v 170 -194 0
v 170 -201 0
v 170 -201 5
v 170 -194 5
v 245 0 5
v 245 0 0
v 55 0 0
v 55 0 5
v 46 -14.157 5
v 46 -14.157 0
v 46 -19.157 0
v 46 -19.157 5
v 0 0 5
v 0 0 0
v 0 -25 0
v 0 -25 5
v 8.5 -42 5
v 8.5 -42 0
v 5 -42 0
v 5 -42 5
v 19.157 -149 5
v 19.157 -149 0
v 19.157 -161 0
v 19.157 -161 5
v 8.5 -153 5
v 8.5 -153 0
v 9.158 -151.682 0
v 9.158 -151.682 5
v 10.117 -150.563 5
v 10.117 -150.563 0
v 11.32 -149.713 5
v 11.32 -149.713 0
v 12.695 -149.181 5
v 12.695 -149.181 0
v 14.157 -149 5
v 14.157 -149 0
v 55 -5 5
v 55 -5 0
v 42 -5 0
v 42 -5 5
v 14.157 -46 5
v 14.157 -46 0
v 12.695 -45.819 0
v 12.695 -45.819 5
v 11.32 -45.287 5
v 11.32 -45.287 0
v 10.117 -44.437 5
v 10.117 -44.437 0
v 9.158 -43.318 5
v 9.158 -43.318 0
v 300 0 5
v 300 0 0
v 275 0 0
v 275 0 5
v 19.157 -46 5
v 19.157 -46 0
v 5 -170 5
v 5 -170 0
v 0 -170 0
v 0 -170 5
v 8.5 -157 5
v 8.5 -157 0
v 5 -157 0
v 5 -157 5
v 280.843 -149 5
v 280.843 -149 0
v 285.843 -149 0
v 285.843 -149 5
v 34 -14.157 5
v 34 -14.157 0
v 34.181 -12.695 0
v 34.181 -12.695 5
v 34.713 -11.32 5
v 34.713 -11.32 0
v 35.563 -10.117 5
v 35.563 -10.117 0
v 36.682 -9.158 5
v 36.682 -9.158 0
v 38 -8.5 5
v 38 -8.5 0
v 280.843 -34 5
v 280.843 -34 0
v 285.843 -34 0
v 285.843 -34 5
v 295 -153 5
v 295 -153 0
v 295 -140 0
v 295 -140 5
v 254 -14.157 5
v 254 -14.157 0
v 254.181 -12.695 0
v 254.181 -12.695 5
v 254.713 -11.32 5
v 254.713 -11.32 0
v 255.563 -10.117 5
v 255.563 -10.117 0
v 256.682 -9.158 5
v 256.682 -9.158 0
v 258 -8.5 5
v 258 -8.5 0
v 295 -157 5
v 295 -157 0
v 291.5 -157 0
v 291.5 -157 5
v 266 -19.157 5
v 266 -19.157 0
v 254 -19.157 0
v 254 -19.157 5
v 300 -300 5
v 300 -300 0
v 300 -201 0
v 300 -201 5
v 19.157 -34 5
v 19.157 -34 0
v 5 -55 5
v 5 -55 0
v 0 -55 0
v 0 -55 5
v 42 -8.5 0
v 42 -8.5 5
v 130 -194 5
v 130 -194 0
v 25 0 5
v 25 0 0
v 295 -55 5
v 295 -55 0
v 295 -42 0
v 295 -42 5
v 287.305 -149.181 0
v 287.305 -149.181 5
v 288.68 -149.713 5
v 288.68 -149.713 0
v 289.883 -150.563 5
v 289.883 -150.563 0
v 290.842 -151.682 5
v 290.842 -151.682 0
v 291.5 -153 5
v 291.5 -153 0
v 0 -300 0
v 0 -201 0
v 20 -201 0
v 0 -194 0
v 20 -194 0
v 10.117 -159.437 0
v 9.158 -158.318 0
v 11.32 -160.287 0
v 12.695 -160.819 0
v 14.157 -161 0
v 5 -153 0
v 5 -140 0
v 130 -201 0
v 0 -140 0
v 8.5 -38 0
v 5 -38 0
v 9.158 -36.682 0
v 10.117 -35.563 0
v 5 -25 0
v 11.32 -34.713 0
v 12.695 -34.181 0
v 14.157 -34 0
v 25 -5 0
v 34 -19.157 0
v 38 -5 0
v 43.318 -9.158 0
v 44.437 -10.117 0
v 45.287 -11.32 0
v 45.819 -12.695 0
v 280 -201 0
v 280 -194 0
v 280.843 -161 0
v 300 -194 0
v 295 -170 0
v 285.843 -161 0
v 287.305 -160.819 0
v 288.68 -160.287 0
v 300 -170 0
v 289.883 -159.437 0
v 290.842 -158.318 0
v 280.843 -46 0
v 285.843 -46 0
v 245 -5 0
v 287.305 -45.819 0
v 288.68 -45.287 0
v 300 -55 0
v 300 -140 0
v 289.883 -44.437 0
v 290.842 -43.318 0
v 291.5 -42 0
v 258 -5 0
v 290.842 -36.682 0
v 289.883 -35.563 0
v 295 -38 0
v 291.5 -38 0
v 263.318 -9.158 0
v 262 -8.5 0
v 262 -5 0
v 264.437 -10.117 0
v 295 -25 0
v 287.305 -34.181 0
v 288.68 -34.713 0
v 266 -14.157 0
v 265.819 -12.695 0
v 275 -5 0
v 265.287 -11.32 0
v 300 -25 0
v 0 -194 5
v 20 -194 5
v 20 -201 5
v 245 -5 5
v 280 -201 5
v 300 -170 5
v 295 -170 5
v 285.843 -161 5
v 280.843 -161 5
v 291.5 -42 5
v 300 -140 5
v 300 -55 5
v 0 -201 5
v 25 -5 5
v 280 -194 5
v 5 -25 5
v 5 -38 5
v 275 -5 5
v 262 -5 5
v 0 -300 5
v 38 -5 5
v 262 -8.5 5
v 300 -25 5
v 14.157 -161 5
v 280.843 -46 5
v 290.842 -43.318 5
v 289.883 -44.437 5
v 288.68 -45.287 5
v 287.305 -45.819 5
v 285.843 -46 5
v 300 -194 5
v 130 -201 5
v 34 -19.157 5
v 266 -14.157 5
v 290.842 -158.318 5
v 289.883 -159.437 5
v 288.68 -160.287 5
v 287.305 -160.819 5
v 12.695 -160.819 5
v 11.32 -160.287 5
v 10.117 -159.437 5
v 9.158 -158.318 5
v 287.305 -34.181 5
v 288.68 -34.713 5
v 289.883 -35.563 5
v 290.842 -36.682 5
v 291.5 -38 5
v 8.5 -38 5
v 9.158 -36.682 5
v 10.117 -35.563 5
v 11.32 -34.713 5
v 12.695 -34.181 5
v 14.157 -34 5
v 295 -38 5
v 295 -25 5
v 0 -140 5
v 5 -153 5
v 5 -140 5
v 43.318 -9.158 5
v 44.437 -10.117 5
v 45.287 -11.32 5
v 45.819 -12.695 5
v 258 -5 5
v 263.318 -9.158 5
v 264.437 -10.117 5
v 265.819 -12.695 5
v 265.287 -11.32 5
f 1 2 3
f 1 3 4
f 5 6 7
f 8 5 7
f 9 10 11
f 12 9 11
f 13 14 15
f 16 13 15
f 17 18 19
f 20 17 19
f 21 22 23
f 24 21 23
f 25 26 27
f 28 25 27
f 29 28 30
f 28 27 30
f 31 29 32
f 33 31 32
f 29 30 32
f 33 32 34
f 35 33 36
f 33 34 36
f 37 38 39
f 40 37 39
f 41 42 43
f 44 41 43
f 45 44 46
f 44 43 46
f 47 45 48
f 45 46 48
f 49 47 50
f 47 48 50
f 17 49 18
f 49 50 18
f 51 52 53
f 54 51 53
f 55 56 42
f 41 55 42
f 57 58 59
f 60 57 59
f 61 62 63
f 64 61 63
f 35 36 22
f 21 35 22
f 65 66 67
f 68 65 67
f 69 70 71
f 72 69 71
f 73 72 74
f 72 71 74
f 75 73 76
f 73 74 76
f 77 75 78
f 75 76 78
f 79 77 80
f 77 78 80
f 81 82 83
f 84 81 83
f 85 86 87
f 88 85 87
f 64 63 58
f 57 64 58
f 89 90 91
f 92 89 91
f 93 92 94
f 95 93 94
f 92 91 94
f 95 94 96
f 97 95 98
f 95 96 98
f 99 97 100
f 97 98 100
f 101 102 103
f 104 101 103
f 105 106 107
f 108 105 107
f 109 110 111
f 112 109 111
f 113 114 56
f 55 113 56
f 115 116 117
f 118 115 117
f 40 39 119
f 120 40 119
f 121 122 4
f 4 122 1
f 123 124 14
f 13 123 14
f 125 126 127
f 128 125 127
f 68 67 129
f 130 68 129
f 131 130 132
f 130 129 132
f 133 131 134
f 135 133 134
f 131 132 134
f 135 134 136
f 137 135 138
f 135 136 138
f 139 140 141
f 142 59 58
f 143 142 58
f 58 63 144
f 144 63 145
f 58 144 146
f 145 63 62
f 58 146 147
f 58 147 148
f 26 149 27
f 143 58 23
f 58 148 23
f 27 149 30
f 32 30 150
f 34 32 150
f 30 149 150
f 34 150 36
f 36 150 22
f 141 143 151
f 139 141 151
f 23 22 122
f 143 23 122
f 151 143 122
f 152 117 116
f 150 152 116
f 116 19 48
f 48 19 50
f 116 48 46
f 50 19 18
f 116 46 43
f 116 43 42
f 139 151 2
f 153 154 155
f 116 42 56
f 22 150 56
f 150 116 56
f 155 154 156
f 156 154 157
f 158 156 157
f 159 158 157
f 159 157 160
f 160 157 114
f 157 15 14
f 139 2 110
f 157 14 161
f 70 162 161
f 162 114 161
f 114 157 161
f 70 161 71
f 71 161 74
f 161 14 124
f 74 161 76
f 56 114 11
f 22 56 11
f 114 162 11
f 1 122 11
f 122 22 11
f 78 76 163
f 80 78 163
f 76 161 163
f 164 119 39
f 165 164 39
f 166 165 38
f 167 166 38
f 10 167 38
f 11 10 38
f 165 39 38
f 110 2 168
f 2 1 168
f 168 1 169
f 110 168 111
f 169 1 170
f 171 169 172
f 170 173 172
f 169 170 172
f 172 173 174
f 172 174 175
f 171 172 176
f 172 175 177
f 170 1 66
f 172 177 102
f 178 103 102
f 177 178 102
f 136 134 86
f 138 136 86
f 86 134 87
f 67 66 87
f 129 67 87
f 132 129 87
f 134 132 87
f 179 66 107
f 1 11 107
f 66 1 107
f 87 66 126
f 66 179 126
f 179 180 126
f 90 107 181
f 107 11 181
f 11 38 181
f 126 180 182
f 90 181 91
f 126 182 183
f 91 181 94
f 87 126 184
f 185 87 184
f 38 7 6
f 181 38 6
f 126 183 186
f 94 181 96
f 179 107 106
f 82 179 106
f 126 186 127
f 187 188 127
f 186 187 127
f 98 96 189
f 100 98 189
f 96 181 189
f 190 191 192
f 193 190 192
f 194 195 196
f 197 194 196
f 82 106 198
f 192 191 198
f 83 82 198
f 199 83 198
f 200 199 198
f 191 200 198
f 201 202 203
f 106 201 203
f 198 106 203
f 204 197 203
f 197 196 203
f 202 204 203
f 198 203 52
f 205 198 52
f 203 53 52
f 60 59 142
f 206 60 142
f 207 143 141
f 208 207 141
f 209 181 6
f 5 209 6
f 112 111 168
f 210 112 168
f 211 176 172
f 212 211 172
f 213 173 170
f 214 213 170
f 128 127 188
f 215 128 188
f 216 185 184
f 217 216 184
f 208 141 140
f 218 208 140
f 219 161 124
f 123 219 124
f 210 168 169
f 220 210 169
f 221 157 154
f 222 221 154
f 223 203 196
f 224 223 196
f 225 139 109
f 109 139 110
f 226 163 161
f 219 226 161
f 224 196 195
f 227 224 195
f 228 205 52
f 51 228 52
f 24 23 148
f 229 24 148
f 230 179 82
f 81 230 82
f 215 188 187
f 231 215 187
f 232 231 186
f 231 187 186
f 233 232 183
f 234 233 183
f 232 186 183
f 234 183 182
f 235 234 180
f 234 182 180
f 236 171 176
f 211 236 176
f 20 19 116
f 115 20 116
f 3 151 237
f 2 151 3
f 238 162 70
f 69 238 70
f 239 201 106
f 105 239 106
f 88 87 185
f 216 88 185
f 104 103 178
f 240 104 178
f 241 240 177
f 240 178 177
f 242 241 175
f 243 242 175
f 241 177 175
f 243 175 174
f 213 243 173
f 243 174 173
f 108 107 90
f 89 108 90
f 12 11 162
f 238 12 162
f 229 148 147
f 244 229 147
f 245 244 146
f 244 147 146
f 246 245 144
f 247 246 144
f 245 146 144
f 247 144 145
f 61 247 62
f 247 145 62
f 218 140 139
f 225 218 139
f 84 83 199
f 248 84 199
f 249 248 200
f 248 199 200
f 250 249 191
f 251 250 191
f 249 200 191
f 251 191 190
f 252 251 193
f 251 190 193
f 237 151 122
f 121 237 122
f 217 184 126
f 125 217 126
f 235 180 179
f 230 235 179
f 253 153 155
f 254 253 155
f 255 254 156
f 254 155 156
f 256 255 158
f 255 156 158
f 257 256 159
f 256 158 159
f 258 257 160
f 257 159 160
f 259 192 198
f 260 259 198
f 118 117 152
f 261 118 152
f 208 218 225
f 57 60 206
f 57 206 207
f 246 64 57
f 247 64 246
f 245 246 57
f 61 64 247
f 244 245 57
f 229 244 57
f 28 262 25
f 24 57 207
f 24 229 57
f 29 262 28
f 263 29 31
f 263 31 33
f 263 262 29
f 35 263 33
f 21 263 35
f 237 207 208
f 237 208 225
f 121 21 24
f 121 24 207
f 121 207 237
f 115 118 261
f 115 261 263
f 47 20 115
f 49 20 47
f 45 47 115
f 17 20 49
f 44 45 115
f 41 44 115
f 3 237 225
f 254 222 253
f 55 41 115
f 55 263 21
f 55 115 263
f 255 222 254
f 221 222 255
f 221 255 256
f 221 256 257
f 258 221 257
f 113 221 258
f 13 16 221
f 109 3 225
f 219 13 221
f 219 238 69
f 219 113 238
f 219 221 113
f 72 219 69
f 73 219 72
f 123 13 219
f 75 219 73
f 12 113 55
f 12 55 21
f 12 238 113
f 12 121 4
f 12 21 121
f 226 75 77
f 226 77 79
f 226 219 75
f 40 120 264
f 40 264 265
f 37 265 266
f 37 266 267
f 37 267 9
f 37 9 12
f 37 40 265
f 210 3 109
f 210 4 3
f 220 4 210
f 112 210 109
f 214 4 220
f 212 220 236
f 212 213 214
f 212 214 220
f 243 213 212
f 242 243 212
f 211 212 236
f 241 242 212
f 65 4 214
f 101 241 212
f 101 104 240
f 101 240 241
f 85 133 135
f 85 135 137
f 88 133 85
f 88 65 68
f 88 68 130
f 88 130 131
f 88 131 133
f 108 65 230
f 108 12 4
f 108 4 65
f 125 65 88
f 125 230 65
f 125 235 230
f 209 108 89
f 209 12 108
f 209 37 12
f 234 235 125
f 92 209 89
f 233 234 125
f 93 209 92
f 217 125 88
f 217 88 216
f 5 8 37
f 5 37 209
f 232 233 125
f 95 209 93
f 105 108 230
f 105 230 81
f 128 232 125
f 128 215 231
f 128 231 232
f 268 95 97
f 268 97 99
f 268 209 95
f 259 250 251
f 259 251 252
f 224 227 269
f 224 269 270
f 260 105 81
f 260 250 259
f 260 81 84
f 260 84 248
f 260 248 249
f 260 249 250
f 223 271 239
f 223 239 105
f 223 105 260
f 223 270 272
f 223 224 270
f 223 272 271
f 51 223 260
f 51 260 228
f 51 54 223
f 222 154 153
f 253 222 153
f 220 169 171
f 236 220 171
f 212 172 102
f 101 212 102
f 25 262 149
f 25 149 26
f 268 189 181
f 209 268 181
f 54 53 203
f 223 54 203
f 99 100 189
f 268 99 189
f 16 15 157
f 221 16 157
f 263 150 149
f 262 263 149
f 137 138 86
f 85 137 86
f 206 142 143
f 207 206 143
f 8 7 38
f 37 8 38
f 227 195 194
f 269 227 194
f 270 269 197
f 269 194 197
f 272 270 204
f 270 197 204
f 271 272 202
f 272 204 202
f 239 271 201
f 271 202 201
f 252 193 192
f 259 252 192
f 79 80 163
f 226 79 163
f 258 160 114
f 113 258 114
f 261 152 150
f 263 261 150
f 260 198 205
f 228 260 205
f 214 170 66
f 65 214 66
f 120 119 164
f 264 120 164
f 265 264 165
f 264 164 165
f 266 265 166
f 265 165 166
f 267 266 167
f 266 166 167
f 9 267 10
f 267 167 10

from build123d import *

# Parameters (mm, degrees)
F0_W     = 40
F0_H     = 7
F1_DEPTH = 5


with BuildPart() as f1:
    # F0 (on Top) → F1 (new body)
    with BuildSketch(Plane.XY):
        with BuildLine():
            Line((25, 0), (0, 0))
            Line((0, 0), (0, -25))
            Line((0, -25), (5, -25))
            Line((5, -25), (5, -38))
            Line((5, -38), (8.5, -38))
            ThreePointArc((8.5, -38), (10.692753, -35.101021), (14.156854, -34))
            Line((14.156854, -34), (19.156854, -34))
            Line((19.156854, -34), (19.156854, -46))
            Line((19.156854, -46), (14.156854, -46))
            ThreePointArc((14.156854, -46), (10.692753, -44.898979), (8.5, -42))
            Line((8.5, -42), (5, -42))
            Line((5, -42), (5, -55))
            Line((5, -55), (0, -55))
            Line((0, -55), (0, -140))
            Line((0, -140), (5, -140))
            Line((5, -140), (5, -153))
            Line((5, -153), (8.5, -153))
            ThreePointArc((8.5, -153), (10.692753, -150.101021), (14.156854, -149))
            Line((14.156854, -149), (19.156854, -149))
            Line((19.156854, -149), (19.156854, -161))
            Line((19.156854, -161), (14.156854, -161))
            ThreePointArc((14.156854, -161), (10.692753, -159.898979), (8.5, -157))
            Line((8.5, -157), (5, -157))
            Line((5, -157), (5, -170))
            Line((5, -170), (0, -170))
            Line((0, -170), (0, -194))
            Line((0, -194), (20, -194))
            Line((20, -194), (20, -201))
            Line((20, -201), (0, -201))
            Line((0, -201), (0, -300))
            Line((0, -300), (300, -300))
            Line((300, -300), (300, -201))
            Line((300, -201), (280, -201))
            Line((280, -201), (280, -194))
            Line((280, -194), (300, -194))
            Line((300, -194), (300, -170))
            Line((300, -170), (295, -170))
            Line((295, -170), (295, -157))
            Line((295, -157), (291.5, -157))
            ThreePointArc((291.5, -157), (289.307247, -159.898979), (285.843146, -161))
            Line((285.843146, -161), (280.843146, -161))
            Line((280.843146, -161), (280.843146, -149))
            Line((280.843146, -149), (285.843146, -149))
            ThreePointArc((285.843146, -149), (289.307247, -150.101021), (291.5, -153))
            Line((291.5, -153), (295, -153))
            Line((295, -153), (295, -140))
            Line((295, -140), (300, -140))
            Line((300, -140), (300, -55))
            Line((300, -55), (295, -55))
            Line((295, -55), (295, -42))
            Line((295, -42), (291.5, -42))
            ThreePointArc((291.5, -42), (289.307247, -44.898979), (285.843146, -46))
            Line((285.843146, -46), (280.843146, -46))
            Line((280.843146, -46), (280.843146, -34))
            Line((280.843146, -34), (285.843146, -34))
            ThreePointArc((285.843146, -34), (289.307247, -35.101021), (291.5, -38))
            Line((291.5, -38), (295, -38))
            Line((295, -38), (295, -25))
            Line((295, -25), (300, -25))
            Line((300, -25), (300, 0))
            Line((300, 0), (275, 0))
            Line((275, 0), (275, -5))
            Line((275, -5), (262, -5))
            Line((262, -5), (262, -8.5))
            ThreePointArc((262, -8.5), (264.898979, -10.692753), (266, -14.156854))
            Line((266, -14.156854), (266, -19.156854))
            Line((266, -19.156854), (254, -19.156854))
            Line((254, -19.156854), (254, -14.156854))
            ThreePointArc((254, -14.156854), (255.101021, -10.692753), (258, -8.5))
            Line((258, -8.5), (258, -5))
            Line((258, -5), (245, -5))
            Line((245, -5), (245, 0))
            Line((245, 0), (55, 0))
            Line((55, 0), (55, -5))
            Line((55, -5), (42, -5))
            Line((42, -5), (42, -8.5))
            ThreePointArc((42, -8.5), (44.898979, -10.692753), (46, -14.156854))
            Line((46, -14.156854), (46, -19.156854))
            Line((46, -19.156854), (34, -19.156854))
            Line((34, -19.156854), (34, -14.156854))
            ThreePointArc((34, -14.156854), (35.101021, -10.692753), (38, -8.5))
            Line((38, -8.5), (38, -5))
            Line((38, -5), (25, -5))
            Line((25, -5), (25, 0))
        make_face()
        with Locations((150, -197.5)):
            Rectangle(F0_W, F0_H, mode=Mode.SUBTRACT)
    extrude(amount=F1_DEPTH)


solid = f1.part
